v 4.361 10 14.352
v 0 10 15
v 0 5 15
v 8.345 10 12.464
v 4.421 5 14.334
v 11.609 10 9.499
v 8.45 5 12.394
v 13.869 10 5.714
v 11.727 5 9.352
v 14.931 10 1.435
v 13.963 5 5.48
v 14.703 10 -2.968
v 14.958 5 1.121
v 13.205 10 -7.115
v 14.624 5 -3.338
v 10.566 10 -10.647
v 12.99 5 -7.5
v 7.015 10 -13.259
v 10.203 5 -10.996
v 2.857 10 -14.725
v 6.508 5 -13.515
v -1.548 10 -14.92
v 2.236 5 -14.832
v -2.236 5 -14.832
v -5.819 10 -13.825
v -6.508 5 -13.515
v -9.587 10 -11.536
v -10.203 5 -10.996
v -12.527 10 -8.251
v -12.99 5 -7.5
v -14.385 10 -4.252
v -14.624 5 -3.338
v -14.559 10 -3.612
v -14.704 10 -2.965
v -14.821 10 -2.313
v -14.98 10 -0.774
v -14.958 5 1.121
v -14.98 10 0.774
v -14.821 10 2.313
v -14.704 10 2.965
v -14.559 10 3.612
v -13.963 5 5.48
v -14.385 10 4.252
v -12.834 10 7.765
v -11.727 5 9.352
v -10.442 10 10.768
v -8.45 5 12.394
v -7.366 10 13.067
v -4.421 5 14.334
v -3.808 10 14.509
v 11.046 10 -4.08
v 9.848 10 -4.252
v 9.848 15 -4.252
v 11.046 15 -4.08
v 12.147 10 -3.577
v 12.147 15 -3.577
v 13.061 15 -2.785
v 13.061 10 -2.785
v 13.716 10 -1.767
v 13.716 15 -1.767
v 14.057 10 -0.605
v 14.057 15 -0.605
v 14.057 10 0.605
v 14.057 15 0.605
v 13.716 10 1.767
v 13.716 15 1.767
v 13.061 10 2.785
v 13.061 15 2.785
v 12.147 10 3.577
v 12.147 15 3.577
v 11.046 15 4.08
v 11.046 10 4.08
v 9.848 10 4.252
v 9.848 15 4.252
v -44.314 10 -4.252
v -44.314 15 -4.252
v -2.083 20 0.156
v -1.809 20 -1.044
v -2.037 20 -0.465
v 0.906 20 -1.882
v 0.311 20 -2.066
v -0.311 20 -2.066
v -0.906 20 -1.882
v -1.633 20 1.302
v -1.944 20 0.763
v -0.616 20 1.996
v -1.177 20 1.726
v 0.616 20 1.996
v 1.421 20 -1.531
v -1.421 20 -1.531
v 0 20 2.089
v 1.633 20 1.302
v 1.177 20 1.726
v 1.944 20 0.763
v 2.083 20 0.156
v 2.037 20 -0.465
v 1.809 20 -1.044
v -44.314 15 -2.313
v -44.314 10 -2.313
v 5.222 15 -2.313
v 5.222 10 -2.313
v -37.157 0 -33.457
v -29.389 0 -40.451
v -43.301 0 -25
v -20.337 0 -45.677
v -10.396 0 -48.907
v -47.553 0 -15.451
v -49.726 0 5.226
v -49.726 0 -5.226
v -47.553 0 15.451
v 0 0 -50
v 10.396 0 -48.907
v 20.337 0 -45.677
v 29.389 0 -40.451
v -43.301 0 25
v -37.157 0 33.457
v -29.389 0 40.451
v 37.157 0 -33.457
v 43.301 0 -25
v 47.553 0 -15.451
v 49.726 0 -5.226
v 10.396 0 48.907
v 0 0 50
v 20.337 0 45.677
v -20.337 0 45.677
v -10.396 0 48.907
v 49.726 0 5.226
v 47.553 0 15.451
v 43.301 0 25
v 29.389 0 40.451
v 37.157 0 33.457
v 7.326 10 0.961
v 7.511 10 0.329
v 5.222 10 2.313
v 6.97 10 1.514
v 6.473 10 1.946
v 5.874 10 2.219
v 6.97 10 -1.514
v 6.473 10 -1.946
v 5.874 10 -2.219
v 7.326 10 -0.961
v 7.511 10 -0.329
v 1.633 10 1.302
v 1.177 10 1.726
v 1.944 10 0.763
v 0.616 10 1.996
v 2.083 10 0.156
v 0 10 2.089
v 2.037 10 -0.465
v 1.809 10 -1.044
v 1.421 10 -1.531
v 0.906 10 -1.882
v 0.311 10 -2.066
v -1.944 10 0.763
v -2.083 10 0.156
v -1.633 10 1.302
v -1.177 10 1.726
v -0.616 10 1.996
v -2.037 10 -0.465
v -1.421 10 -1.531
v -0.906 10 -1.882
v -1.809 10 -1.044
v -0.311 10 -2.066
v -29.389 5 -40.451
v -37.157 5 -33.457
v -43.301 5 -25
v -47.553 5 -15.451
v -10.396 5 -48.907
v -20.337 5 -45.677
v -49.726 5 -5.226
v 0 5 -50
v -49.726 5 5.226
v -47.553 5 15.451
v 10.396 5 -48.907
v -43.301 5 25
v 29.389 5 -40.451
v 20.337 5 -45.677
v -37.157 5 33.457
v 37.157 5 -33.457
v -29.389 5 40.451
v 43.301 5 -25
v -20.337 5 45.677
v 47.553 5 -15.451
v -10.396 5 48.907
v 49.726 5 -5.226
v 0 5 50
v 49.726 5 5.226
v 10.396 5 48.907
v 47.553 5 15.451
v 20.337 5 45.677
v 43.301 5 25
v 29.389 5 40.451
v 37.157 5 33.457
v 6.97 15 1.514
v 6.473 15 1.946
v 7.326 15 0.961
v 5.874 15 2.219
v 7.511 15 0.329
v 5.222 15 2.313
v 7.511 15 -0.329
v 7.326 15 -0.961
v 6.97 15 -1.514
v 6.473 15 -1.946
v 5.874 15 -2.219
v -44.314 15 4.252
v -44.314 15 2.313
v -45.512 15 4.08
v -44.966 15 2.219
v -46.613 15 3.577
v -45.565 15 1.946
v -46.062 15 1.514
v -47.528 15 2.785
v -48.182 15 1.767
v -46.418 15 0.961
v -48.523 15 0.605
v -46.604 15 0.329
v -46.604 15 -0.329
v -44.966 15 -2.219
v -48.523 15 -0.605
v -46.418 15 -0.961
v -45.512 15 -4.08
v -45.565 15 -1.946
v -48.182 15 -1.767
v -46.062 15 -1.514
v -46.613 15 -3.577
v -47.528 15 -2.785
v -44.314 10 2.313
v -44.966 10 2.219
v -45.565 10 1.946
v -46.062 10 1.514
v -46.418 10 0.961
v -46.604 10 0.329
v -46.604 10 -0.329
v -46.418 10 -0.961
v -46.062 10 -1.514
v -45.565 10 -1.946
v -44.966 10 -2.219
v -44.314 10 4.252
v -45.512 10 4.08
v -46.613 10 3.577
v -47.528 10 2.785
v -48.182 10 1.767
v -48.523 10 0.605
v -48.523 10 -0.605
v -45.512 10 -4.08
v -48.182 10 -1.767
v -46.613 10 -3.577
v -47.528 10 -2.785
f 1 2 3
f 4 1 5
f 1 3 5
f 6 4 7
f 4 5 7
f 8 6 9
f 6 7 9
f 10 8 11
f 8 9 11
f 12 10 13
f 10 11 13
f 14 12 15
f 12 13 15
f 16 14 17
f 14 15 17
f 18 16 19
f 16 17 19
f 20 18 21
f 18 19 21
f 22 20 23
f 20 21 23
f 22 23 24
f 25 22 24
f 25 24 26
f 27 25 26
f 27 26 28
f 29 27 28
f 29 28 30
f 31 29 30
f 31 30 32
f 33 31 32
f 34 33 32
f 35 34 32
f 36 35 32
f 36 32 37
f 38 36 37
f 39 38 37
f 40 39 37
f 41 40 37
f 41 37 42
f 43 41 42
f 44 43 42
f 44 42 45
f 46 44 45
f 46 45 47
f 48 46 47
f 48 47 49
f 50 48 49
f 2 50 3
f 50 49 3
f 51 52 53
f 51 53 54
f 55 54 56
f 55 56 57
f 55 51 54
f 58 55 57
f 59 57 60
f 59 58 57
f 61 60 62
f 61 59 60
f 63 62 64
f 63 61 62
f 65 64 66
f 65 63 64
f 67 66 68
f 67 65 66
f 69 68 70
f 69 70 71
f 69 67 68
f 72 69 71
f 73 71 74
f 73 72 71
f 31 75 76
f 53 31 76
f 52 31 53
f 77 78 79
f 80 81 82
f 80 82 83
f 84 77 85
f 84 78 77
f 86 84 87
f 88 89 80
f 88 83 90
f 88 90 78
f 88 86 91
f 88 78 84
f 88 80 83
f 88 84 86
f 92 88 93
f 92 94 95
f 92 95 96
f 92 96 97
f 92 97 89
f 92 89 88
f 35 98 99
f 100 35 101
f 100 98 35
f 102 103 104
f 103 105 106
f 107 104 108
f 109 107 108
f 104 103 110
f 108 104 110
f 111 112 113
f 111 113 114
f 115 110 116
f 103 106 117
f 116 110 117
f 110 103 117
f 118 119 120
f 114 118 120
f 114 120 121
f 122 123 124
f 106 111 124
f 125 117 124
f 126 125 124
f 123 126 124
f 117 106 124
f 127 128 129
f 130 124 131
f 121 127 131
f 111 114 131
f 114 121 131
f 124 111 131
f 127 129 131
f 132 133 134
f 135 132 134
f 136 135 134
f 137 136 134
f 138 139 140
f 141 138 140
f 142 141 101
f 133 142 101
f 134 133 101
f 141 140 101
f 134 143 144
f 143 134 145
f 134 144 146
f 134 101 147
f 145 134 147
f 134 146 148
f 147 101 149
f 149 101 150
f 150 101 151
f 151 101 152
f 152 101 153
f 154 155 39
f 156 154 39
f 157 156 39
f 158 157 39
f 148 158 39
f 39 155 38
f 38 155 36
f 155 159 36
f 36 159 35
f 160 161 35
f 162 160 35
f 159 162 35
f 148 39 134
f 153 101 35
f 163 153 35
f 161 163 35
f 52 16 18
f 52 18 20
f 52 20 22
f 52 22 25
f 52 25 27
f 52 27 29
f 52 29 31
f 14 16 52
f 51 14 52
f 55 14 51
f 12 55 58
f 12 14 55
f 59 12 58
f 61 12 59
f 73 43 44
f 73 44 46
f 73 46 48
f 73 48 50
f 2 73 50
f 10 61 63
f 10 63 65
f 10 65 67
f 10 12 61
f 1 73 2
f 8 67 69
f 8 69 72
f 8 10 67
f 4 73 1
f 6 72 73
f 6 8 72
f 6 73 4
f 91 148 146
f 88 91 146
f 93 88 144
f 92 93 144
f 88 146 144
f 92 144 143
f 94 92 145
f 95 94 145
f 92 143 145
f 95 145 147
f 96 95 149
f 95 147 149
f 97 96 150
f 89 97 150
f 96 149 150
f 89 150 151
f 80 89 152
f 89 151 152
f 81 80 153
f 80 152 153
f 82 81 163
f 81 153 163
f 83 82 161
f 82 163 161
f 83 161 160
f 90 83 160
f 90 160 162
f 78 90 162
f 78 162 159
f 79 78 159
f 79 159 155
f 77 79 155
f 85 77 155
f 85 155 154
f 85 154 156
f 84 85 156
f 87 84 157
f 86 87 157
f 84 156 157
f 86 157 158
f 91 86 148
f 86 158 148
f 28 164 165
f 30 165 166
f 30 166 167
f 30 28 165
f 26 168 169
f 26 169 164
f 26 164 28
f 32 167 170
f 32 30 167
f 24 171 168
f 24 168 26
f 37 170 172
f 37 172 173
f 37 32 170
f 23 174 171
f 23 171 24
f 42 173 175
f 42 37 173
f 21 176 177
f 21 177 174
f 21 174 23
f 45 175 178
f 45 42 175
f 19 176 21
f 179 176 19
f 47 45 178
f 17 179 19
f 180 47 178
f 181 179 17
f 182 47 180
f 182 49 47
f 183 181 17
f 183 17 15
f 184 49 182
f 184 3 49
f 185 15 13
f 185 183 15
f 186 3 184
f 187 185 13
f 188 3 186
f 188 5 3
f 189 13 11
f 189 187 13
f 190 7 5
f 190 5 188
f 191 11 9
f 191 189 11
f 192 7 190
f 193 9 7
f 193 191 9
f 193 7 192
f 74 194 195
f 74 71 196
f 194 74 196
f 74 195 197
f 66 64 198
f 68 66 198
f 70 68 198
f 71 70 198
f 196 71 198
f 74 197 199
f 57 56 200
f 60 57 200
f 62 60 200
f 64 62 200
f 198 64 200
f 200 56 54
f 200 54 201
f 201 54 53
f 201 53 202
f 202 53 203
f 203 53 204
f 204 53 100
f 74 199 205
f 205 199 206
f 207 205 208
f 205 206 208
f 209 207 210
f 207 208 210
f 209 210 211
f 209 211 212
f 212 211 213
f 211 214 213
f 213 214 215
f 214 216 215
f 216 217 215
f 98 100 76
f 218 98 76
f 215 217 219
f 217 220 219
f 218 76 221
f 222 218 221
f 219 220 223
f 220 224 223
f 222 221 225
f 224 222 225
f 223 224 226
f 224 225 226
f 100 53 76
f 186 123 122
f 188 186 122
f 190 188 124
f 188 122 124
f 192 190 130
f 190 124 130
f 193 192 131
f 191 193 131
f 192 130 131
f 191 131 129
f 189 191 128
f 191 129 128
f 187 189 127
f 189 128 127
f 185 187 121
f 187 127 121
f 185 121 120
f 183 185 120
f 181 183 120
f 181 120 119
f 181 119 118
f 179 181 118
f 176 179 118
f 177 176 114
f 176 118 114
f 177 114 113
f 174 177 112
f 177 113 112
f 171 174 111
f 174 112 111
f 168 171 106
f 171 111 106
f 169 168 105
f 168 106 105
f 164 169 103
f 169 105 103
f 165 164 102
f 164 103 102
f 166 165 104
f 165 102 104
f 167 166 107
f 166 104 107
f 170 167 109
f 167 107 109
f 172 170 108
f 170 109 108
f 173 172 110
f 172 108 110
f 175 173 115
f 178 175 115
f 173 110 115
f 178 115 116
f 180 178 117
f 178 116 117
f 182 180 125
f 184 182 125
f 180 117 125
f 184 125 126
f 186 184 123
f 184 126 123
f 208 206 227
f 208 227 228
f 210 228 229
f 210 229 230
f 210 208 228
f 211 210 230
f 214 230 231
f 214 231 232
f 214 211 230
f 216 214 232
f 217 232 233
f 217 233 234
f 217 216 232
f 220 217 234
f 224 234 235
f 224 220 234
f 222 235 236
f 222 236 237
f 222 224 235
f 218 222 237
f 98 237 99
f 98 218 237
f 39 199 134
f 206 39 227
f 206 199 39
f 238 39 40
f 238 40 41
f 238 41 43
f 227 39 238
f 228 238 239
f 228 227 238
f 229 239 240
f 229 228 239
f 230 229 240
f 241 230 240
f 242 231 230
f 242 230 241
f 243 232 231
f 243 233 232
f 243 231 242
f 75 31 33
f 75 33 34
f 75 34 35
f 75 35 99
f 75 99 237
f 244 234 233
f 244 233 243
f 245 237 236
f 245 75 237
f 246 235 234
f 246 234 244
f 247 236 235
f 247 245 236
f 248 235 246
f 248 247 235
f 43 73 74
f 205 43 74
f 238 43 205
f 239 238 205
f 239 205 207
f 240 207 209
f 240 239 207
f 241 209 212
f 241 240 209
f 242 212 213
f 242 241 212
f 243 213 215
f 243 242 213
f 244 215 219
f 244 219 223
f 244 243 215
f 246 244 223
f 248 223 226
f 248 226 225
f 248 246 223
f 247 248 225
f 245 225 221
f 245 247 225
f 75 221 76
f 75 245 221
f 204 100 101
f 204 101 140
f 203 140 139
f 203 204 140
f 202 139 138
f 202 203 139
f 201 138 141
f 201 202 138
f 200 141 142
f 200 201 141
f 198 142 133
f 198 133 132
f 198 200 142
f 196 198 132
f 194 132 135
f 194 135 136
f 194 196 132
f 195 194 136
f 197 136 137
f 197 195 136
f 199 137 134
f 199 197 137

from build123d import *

# Parameters (mm, degrees)
SKETCH1_R           = 50
BOSS_EXTRUDE1_DEPTH = 5
SKETCH2_R           = 15
BOSS_EXTRUDE2_DEPTH = 5
BOSS_EXTRUDE3_DEPTH = 5
CUT_EXTRUDE1_DEPTH  = 5
SKETCH6_R           = 2.088892153
BOSS_EXTRUDE4_DEPTH = 10


with BuildPart() as part:
    # Sketch1 → Boss-Extrude1 (new body)
    with BuildSketch(Plane(origin=(0, 0, 0), x_dir=(1, 0, 0), z_dir=(0, 1, 0))):
        Circle(SKETCH1_R)
    extrude(amount=BOSS_EXTRUDE1_DEPTH)

    # Sketch2 → Boss-Extrude2 (add)
    with BuildSketch(Plane(origin=(0, 5, 0), x_dir=(1, 0, 0), z_dir=(0, 1, 0))):
        Circle(SKETCH2_R)
    extrude(amount=BOSS_EXTRUDE2_DEPTH)

    # Sketch4 → Boss-Extrude3 (add)
    with BuildSketch(Plane(origin=(0, 10, 0), x_dir=(1, 0, 0), z_dir=(0, 1, 0))):
        with BuildLine():
            Line((9.847634435, -4.252387597), (-44.314354955, -4.252387597))
            ThreePointArc((-44.314354955, -4.252387597), (-48.566742552, 0), (-44.314354955, 4.252387597))
            Line((-44.314354955, 4.252387597), (9.847634435, 4.252387597))
            ThreePointArc((9.847634435, 4.252387597), (14.100022031, 0), (9.847634435, -4.252387597))
        make_face()
    extrude(amount=BOSS_EXTRUDE3_DEPTH)

    # Sketch5 → Cut-Extrude1 (cut)
    with BuildSketch(Plane(origin=(0, 15, 0), x_dir=(1, 0, 0), z_dir=(0, 1, 0))):
        with BuildLine():
            Line((5.222230382, -2.312702026), (-44.314354955, -2.312702026))
            ThreePointArc((-44.314354955, -2.312702026), (-46.627056982, 0), (-44.314354955, 2.312702026))
            Line((-44.314354955, 2.312702026), (5.222230382, 2.312702026))
            ThreePointArc((5.222230382, 2.312702026), (7.534932408, 0), (5.222230382, -2.312702026))
        make_face()
    extrude(amount=-CUT_EXTRUDE1_DEPTH, mode=Mode.SUBTRACT)

    # Sketch6 → Boss-Extrude4 (add)
    with BuildSketch(Plane(origin=(0, 10, 0), x_dir=(1, 0, 0), z_dir=(0, 1, 0))):
        Circle(SKETCH6_R)
    extrude(amount=BOSS_EXTRUDE4_DEPTH)


solid = part.part
